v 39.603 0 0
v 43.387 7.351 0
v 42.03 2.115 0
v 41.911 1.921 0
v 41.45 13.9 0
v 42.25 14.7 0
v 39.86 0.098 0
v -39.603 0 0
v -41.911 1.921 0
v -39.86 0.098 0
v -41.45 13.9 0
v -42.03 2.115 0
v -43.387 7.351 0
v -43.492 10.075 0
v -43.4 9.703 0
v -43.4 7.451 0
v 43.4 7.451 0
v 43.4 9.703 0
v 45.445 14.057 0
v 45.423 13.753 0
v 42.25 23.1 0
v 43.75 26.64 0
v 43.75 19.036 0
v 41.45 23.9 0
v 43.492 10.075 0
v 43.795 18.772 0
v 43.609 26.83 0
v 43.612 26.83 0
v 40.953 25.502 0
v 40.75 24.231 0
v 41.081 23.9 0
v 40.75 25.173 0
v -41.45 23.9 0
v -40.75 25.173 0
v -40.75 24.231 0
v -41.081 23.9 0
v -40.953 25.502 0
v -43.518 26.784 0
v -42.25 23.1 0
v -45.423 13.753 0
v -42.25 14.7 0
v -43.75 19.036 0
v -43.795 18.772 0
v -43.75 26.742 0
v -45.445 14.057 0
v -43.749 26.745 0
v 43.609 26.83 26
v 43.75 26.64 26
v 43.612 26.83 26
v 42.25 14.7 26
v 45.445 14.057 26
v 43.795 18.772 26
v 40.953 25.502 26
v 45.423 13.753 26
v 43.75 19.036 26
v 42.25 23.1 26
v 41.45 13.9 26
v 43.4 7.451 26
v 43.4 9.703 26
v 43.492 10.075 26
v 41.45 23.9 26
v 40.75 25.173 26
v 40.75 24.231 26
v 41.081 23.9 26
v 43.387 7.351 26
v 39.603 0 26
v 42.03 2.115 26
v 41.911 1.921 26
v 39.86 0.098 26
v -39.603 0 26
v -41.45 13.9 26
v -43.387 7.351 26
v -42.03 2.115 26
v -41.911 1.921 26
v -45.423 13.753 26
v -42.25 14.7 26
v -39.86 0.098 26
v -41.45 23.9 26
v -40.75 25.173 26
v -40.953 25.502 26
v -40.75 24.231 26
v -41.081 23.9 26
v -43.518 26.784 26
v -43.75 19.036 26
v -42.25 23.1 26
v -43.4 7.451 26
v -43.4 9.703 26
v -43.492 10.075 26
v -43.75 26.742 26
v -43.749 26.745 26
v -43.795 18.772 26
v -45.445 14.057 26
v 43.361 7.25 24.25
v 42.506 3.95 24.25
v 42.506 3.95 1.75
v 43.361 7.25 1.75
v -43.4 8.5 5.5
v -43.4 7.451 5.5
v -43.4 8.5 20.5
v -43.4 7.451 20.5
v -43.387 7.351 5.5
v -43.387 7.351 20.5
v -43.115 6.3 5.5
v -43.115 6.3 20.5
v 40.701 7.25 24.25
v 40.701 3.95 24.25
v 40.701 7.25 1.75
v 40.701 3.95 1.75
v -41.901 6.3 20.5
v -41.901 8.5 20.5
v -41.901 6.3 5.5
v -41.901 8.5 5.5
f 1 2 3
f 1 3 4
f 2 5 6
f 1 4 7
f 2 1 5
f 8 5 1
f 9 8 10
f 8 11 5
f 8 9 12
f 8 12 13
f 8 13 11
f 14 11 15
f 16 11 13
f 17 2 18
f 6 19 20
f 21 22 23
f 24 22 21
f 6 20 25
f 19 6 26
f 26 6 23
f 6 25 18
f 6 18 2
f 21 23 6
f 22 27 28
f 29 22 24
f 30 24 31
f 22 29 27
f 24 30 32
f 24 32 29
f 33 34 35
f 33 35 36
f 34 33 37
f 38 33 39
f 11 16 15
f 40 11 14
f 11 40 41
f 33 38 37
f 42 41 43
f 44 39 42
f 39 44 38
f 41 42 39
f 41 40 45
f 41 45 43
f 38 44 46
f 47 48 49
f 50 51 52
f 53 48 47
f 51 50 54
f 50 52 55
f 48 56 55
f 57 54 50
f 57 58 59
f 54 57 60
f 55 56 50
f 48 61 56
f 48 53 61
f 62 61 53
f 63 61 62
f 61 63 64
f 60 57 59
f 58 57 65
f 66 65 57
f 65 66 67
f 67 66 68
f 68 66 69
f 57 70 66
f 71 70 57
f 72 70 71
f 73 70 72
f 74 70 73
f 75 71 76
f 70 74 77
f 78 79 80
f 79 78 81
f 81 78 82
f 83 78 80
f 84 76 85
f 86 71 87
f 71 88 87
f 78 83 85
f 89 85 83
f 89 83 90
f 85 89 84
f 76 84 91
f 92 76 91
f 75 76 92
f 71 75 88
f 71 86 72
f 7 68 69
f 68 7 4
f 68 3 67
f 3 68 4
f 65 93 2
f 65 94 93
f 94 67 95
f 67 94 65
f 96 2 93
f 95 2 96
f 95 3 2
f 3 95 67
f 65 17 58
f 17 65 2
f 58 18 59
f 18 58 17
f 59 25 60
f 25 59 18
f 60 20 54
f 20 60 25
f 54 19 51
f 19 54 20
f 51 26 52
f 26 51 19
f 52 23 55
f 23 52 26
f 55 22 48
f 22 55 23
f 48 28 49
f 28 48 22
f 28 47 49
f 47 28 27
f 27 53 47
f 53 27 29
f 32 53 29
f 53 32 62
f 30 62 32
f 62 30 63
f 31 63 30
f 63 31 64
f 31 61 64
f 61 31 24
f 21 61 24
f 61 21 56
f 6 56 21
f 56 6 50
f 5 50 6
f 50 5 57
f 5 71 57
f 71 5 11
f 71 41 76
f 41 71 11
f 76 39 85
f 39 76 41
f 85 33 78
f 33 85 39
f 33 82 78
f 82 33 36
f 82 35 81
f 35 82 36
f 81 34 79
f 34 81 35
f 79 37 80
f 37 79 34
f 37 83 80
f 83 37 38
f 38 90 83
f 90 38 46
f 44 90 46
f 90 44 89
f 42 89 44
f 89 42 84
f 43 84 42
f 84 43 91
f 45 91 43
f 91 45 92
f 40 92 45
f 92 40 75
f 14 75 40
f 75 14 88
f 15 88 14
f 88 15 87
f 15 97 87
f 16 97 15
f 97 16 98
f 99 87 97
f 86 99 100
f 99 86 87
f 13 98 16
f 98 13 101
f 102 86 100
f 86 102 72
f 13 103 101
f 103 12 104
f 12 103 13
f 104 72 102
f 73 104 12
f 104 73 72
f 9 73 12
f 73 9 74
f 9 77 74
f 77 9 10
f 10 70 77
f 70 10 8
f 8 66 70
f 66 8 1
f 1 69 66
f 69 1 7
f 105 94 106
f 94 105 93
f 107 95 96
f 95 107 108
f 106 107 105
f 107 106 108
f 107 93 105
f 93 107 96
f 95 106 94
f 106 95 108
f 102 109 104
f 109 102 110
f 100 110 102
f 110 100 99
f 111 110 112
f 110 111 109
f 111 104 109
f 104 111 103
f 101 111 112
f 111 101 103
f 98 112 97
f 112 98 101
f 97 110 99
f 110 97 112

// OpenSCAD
// file: paths.scad
function sumTo(v,n) = n<=0 ? 0 : v[n-1]+sumTo(v,n-1);
function sum(v) = sumTo(v,len(v));
function interpolationData(v) = let(
    n=len(v)-1,
    d=[for (i=[0:n-1]) norm(v[i]-v[i+1])],
    sumD=[for (i=[0:n]) sumTo(d,i)],
    totalD=sumD[n]) 
        [d,sumD,v,totalD];
function totalLength(interp) = interp[3];
function interpolatePoints(a,b,t) = (1-t)*a+(t)*b;
function findSegmentByDistance(sumD,distance) = let(
    found = [for(i=[0:len(sumD)-1]) if(sumD[i]<=distance && distance<sumD[i+1]) i])
        len(found)>0 ? found[0] : -1;
function interpolateByDistance(interp,distance) = let(
    n=len(interp[1])-1,
    d=interp[0],
    sumD=interp[1],
    v=interp[2],
    totalD=interp[3],
    i=findSegmentByDistance(sumD,distance))
        i<0 ? (distance<totalD/2 ? v[0] : v[n]) :
            interpolatePoints(v[i],v[i+1],(distance-sumD[i])/d[i]);
function get2DNormalBetweenPoints(a,b) = let(
    v = (b-a)/norm(b-a))
        [v[1],-v[0]];
function getTangentByDistance(interp,distance) = let(
    n=len(interp[1])-1,
    d=interp[0],
    sumD=interp[1],
    v=interp[2],
    totalD=interp[3],
    i0=findSegmentByDistance(sumD,distance),
    i = i0 < 0 ? (distance<totalD/2 ? 0 : n-1) : i0)
        (v[i+1]-v[i])/norm(v[i+1]-v[i]);
    
function interpolateByParameter(interp,t) = interpolateByDistance(interp,t*totalLength(interp));
function singleInterpolateByDistance(v,distance) = interpolateByDistance(interpolationData(v),distance);
function singleInterpolateByParameter(v,t) = interpolateByParameter(interpolationData(v),t);
function measurePath(v) = totalLength(interpolationData(v));

function findCoordinateIntersection2(a,b,index,value) = 
    a[index] == value ? a : 
        b[index] == value ? b :
            let( t=(value-a[index]) / (b[index]-a[index]))
                (1-t)*a+t*b;

function findCoordinateIntersections(path,index,value) = 
    [for (i=[0:len(path)-2]) if ((path[i][index]-value)*(path[i+1][index]-value) <= 0) findCoordinateIntersection2(path[i],path[i+1],index,value)];            

function mirrorMatrix(normalVector) = let(v = normalVector/norm(normalVector)) len(v)<3 ? [[1-2*v[0]*v[0],-2*v[0]*v[1]],[-2*v[0]*v[1],1-2*v[1]*v[1]]] : [[1-2*v[0]*v[0],-2*v[0]*v[1],-2*v[0]*v[2]],[-2*v[0]*v[1],1-2*v[1]*v[1],-2*v[1]*v[2]],[-2*v[0]*v[2],-2*v[1]*v[2],1-2*v[2]*v[2]]];

function trimArray(a, n) = [for (i=[0:n-1]) a[i]];

function transformPoint(matrix,a) = 
    let(n=len(a))
        len(matrix[0])==n+1 ? 
            trimArray(matrix * concat(a,[1]), n)
            : matrix * a;

function transformPath(matrix,path) =
    [for (a=path) transformPoint(matrix,a)];

function reverseArray(array) = let(n=len(array)) [for (i=[0:n-1]) array[n-1-i]];

function stitchPaths(a,b) = let(na=len(a)) [for (i=[0:na+len(b)-2]) i<na? a[i] : b[i-na+1]-b[0]+a[na-1]];

//interp = interpolationData([[1,2],[2,3],[1,2]]);
//echo(singleInterpolateByParameter([[1,1],[2,2],[3,1]],0.75));
//echo(measurePath([[1,2],[2,3],[1,2]]));
// main file
use <paths.scad>;

//<params>
b1 = 79.5;
b1a = 85.0-1;
b2 = 87-.2;
b3 = 91;
h1a = 2;
hDelta = 4;
rightNubFromBase = 5.6;
rightNubSlitThickness = 3.3;
rightNubSlitLength = 22.5;;
rightNubSlitDepth = 2.7;
leftNubFromBase = 7.4;
leftNubSlitThickness = 2.2;
leftNubSlitLength = 15;
leftNubSlitDepth = 1.5;
fromNubsToPhone = 3.5+3;
phoneWidth = 77.5+7;
snapHeight = 10;
snapInset = 1.5;
snapThickness = 1.5;
holderWidth = 26;
rounding = 0.8;
//</params>

module dummy() {}

nudge = 0.001;

rightPath = 
  [ [b1/2,0],
    [b1a/2,h1a],
    [b2/2,max(leftNubFromBase,rightNubFromBase)],
    [b2/2,max(leftNubFromBase,rightNubFromBase)+fromNubsToPhone-hDelta],
    [b3/2,max(leftNubFromBase,rightNubFromBase)+fromNubsToPhone],
    [phoneWidth/2+snapThickness,max(leftNubFromBase,rightNubFromBase)+fromNubsToPhone+snapHeight*0.5],
    [phoneWidth/2+snapThickness,max(leftNubFromBase,rightNubFromBase)+fromNubsToPhone+snapHeight+snapThickness+1.5],
    [phoneWidth/2-snapInset,max(leftNubFromBase,rightNubFromBase)+fromNubsToPhone+snapHeight+snapThickness],
    [phoneWidth/2-snapInset,max(leftNubFromBase,rightNubFromBase)+fromNubsToPhone+snapHeight],
    [phoneWidth/2,max(leftNubFromBase,rightNubFromBase)+fromNubsToPhone+snapHeight],
    [phoneWidth/2,max(leftNubFromBase,rightNubFromBase)+fromNubsToPhone],
    [0, max(leftNubFromBase,rightNubFromBase)+fromNubsToPhone]];
    
    
path = stitchPaths(rightPath,reverseArray(transformPath(mirrorMatrix([1,0]),rightPath)));

module mainHolder() {
    linear_extrude(height=holderWidth) 
offset(r=-rounding) offset(r=rounding) polygon(points=path);
}

module slit(nubFromBase,nubSlitThickness,nubSlitLength,nubSlitDepth) {
    translate([b2/2+nudge-nubSlitDepth,nubFromBase-nubSlitThickness/2,holderWidth/2-nubSlitLength/2])
    cube([nubSlitDepth+nudge,nubSlitThickness,nubSlitLength]);
}

render(convexity=2)
difference() {
    mainHolder();
    slit(rightNubFromBase,rightNubSlitThickness,rightNubSlitLength,rightNubSlitDepth);
    mirror([1,0,0]) slit(leftNubFromBase,leftNubSlitThickness,leftNubSlitLength,leftNubSlitDepth);
}
